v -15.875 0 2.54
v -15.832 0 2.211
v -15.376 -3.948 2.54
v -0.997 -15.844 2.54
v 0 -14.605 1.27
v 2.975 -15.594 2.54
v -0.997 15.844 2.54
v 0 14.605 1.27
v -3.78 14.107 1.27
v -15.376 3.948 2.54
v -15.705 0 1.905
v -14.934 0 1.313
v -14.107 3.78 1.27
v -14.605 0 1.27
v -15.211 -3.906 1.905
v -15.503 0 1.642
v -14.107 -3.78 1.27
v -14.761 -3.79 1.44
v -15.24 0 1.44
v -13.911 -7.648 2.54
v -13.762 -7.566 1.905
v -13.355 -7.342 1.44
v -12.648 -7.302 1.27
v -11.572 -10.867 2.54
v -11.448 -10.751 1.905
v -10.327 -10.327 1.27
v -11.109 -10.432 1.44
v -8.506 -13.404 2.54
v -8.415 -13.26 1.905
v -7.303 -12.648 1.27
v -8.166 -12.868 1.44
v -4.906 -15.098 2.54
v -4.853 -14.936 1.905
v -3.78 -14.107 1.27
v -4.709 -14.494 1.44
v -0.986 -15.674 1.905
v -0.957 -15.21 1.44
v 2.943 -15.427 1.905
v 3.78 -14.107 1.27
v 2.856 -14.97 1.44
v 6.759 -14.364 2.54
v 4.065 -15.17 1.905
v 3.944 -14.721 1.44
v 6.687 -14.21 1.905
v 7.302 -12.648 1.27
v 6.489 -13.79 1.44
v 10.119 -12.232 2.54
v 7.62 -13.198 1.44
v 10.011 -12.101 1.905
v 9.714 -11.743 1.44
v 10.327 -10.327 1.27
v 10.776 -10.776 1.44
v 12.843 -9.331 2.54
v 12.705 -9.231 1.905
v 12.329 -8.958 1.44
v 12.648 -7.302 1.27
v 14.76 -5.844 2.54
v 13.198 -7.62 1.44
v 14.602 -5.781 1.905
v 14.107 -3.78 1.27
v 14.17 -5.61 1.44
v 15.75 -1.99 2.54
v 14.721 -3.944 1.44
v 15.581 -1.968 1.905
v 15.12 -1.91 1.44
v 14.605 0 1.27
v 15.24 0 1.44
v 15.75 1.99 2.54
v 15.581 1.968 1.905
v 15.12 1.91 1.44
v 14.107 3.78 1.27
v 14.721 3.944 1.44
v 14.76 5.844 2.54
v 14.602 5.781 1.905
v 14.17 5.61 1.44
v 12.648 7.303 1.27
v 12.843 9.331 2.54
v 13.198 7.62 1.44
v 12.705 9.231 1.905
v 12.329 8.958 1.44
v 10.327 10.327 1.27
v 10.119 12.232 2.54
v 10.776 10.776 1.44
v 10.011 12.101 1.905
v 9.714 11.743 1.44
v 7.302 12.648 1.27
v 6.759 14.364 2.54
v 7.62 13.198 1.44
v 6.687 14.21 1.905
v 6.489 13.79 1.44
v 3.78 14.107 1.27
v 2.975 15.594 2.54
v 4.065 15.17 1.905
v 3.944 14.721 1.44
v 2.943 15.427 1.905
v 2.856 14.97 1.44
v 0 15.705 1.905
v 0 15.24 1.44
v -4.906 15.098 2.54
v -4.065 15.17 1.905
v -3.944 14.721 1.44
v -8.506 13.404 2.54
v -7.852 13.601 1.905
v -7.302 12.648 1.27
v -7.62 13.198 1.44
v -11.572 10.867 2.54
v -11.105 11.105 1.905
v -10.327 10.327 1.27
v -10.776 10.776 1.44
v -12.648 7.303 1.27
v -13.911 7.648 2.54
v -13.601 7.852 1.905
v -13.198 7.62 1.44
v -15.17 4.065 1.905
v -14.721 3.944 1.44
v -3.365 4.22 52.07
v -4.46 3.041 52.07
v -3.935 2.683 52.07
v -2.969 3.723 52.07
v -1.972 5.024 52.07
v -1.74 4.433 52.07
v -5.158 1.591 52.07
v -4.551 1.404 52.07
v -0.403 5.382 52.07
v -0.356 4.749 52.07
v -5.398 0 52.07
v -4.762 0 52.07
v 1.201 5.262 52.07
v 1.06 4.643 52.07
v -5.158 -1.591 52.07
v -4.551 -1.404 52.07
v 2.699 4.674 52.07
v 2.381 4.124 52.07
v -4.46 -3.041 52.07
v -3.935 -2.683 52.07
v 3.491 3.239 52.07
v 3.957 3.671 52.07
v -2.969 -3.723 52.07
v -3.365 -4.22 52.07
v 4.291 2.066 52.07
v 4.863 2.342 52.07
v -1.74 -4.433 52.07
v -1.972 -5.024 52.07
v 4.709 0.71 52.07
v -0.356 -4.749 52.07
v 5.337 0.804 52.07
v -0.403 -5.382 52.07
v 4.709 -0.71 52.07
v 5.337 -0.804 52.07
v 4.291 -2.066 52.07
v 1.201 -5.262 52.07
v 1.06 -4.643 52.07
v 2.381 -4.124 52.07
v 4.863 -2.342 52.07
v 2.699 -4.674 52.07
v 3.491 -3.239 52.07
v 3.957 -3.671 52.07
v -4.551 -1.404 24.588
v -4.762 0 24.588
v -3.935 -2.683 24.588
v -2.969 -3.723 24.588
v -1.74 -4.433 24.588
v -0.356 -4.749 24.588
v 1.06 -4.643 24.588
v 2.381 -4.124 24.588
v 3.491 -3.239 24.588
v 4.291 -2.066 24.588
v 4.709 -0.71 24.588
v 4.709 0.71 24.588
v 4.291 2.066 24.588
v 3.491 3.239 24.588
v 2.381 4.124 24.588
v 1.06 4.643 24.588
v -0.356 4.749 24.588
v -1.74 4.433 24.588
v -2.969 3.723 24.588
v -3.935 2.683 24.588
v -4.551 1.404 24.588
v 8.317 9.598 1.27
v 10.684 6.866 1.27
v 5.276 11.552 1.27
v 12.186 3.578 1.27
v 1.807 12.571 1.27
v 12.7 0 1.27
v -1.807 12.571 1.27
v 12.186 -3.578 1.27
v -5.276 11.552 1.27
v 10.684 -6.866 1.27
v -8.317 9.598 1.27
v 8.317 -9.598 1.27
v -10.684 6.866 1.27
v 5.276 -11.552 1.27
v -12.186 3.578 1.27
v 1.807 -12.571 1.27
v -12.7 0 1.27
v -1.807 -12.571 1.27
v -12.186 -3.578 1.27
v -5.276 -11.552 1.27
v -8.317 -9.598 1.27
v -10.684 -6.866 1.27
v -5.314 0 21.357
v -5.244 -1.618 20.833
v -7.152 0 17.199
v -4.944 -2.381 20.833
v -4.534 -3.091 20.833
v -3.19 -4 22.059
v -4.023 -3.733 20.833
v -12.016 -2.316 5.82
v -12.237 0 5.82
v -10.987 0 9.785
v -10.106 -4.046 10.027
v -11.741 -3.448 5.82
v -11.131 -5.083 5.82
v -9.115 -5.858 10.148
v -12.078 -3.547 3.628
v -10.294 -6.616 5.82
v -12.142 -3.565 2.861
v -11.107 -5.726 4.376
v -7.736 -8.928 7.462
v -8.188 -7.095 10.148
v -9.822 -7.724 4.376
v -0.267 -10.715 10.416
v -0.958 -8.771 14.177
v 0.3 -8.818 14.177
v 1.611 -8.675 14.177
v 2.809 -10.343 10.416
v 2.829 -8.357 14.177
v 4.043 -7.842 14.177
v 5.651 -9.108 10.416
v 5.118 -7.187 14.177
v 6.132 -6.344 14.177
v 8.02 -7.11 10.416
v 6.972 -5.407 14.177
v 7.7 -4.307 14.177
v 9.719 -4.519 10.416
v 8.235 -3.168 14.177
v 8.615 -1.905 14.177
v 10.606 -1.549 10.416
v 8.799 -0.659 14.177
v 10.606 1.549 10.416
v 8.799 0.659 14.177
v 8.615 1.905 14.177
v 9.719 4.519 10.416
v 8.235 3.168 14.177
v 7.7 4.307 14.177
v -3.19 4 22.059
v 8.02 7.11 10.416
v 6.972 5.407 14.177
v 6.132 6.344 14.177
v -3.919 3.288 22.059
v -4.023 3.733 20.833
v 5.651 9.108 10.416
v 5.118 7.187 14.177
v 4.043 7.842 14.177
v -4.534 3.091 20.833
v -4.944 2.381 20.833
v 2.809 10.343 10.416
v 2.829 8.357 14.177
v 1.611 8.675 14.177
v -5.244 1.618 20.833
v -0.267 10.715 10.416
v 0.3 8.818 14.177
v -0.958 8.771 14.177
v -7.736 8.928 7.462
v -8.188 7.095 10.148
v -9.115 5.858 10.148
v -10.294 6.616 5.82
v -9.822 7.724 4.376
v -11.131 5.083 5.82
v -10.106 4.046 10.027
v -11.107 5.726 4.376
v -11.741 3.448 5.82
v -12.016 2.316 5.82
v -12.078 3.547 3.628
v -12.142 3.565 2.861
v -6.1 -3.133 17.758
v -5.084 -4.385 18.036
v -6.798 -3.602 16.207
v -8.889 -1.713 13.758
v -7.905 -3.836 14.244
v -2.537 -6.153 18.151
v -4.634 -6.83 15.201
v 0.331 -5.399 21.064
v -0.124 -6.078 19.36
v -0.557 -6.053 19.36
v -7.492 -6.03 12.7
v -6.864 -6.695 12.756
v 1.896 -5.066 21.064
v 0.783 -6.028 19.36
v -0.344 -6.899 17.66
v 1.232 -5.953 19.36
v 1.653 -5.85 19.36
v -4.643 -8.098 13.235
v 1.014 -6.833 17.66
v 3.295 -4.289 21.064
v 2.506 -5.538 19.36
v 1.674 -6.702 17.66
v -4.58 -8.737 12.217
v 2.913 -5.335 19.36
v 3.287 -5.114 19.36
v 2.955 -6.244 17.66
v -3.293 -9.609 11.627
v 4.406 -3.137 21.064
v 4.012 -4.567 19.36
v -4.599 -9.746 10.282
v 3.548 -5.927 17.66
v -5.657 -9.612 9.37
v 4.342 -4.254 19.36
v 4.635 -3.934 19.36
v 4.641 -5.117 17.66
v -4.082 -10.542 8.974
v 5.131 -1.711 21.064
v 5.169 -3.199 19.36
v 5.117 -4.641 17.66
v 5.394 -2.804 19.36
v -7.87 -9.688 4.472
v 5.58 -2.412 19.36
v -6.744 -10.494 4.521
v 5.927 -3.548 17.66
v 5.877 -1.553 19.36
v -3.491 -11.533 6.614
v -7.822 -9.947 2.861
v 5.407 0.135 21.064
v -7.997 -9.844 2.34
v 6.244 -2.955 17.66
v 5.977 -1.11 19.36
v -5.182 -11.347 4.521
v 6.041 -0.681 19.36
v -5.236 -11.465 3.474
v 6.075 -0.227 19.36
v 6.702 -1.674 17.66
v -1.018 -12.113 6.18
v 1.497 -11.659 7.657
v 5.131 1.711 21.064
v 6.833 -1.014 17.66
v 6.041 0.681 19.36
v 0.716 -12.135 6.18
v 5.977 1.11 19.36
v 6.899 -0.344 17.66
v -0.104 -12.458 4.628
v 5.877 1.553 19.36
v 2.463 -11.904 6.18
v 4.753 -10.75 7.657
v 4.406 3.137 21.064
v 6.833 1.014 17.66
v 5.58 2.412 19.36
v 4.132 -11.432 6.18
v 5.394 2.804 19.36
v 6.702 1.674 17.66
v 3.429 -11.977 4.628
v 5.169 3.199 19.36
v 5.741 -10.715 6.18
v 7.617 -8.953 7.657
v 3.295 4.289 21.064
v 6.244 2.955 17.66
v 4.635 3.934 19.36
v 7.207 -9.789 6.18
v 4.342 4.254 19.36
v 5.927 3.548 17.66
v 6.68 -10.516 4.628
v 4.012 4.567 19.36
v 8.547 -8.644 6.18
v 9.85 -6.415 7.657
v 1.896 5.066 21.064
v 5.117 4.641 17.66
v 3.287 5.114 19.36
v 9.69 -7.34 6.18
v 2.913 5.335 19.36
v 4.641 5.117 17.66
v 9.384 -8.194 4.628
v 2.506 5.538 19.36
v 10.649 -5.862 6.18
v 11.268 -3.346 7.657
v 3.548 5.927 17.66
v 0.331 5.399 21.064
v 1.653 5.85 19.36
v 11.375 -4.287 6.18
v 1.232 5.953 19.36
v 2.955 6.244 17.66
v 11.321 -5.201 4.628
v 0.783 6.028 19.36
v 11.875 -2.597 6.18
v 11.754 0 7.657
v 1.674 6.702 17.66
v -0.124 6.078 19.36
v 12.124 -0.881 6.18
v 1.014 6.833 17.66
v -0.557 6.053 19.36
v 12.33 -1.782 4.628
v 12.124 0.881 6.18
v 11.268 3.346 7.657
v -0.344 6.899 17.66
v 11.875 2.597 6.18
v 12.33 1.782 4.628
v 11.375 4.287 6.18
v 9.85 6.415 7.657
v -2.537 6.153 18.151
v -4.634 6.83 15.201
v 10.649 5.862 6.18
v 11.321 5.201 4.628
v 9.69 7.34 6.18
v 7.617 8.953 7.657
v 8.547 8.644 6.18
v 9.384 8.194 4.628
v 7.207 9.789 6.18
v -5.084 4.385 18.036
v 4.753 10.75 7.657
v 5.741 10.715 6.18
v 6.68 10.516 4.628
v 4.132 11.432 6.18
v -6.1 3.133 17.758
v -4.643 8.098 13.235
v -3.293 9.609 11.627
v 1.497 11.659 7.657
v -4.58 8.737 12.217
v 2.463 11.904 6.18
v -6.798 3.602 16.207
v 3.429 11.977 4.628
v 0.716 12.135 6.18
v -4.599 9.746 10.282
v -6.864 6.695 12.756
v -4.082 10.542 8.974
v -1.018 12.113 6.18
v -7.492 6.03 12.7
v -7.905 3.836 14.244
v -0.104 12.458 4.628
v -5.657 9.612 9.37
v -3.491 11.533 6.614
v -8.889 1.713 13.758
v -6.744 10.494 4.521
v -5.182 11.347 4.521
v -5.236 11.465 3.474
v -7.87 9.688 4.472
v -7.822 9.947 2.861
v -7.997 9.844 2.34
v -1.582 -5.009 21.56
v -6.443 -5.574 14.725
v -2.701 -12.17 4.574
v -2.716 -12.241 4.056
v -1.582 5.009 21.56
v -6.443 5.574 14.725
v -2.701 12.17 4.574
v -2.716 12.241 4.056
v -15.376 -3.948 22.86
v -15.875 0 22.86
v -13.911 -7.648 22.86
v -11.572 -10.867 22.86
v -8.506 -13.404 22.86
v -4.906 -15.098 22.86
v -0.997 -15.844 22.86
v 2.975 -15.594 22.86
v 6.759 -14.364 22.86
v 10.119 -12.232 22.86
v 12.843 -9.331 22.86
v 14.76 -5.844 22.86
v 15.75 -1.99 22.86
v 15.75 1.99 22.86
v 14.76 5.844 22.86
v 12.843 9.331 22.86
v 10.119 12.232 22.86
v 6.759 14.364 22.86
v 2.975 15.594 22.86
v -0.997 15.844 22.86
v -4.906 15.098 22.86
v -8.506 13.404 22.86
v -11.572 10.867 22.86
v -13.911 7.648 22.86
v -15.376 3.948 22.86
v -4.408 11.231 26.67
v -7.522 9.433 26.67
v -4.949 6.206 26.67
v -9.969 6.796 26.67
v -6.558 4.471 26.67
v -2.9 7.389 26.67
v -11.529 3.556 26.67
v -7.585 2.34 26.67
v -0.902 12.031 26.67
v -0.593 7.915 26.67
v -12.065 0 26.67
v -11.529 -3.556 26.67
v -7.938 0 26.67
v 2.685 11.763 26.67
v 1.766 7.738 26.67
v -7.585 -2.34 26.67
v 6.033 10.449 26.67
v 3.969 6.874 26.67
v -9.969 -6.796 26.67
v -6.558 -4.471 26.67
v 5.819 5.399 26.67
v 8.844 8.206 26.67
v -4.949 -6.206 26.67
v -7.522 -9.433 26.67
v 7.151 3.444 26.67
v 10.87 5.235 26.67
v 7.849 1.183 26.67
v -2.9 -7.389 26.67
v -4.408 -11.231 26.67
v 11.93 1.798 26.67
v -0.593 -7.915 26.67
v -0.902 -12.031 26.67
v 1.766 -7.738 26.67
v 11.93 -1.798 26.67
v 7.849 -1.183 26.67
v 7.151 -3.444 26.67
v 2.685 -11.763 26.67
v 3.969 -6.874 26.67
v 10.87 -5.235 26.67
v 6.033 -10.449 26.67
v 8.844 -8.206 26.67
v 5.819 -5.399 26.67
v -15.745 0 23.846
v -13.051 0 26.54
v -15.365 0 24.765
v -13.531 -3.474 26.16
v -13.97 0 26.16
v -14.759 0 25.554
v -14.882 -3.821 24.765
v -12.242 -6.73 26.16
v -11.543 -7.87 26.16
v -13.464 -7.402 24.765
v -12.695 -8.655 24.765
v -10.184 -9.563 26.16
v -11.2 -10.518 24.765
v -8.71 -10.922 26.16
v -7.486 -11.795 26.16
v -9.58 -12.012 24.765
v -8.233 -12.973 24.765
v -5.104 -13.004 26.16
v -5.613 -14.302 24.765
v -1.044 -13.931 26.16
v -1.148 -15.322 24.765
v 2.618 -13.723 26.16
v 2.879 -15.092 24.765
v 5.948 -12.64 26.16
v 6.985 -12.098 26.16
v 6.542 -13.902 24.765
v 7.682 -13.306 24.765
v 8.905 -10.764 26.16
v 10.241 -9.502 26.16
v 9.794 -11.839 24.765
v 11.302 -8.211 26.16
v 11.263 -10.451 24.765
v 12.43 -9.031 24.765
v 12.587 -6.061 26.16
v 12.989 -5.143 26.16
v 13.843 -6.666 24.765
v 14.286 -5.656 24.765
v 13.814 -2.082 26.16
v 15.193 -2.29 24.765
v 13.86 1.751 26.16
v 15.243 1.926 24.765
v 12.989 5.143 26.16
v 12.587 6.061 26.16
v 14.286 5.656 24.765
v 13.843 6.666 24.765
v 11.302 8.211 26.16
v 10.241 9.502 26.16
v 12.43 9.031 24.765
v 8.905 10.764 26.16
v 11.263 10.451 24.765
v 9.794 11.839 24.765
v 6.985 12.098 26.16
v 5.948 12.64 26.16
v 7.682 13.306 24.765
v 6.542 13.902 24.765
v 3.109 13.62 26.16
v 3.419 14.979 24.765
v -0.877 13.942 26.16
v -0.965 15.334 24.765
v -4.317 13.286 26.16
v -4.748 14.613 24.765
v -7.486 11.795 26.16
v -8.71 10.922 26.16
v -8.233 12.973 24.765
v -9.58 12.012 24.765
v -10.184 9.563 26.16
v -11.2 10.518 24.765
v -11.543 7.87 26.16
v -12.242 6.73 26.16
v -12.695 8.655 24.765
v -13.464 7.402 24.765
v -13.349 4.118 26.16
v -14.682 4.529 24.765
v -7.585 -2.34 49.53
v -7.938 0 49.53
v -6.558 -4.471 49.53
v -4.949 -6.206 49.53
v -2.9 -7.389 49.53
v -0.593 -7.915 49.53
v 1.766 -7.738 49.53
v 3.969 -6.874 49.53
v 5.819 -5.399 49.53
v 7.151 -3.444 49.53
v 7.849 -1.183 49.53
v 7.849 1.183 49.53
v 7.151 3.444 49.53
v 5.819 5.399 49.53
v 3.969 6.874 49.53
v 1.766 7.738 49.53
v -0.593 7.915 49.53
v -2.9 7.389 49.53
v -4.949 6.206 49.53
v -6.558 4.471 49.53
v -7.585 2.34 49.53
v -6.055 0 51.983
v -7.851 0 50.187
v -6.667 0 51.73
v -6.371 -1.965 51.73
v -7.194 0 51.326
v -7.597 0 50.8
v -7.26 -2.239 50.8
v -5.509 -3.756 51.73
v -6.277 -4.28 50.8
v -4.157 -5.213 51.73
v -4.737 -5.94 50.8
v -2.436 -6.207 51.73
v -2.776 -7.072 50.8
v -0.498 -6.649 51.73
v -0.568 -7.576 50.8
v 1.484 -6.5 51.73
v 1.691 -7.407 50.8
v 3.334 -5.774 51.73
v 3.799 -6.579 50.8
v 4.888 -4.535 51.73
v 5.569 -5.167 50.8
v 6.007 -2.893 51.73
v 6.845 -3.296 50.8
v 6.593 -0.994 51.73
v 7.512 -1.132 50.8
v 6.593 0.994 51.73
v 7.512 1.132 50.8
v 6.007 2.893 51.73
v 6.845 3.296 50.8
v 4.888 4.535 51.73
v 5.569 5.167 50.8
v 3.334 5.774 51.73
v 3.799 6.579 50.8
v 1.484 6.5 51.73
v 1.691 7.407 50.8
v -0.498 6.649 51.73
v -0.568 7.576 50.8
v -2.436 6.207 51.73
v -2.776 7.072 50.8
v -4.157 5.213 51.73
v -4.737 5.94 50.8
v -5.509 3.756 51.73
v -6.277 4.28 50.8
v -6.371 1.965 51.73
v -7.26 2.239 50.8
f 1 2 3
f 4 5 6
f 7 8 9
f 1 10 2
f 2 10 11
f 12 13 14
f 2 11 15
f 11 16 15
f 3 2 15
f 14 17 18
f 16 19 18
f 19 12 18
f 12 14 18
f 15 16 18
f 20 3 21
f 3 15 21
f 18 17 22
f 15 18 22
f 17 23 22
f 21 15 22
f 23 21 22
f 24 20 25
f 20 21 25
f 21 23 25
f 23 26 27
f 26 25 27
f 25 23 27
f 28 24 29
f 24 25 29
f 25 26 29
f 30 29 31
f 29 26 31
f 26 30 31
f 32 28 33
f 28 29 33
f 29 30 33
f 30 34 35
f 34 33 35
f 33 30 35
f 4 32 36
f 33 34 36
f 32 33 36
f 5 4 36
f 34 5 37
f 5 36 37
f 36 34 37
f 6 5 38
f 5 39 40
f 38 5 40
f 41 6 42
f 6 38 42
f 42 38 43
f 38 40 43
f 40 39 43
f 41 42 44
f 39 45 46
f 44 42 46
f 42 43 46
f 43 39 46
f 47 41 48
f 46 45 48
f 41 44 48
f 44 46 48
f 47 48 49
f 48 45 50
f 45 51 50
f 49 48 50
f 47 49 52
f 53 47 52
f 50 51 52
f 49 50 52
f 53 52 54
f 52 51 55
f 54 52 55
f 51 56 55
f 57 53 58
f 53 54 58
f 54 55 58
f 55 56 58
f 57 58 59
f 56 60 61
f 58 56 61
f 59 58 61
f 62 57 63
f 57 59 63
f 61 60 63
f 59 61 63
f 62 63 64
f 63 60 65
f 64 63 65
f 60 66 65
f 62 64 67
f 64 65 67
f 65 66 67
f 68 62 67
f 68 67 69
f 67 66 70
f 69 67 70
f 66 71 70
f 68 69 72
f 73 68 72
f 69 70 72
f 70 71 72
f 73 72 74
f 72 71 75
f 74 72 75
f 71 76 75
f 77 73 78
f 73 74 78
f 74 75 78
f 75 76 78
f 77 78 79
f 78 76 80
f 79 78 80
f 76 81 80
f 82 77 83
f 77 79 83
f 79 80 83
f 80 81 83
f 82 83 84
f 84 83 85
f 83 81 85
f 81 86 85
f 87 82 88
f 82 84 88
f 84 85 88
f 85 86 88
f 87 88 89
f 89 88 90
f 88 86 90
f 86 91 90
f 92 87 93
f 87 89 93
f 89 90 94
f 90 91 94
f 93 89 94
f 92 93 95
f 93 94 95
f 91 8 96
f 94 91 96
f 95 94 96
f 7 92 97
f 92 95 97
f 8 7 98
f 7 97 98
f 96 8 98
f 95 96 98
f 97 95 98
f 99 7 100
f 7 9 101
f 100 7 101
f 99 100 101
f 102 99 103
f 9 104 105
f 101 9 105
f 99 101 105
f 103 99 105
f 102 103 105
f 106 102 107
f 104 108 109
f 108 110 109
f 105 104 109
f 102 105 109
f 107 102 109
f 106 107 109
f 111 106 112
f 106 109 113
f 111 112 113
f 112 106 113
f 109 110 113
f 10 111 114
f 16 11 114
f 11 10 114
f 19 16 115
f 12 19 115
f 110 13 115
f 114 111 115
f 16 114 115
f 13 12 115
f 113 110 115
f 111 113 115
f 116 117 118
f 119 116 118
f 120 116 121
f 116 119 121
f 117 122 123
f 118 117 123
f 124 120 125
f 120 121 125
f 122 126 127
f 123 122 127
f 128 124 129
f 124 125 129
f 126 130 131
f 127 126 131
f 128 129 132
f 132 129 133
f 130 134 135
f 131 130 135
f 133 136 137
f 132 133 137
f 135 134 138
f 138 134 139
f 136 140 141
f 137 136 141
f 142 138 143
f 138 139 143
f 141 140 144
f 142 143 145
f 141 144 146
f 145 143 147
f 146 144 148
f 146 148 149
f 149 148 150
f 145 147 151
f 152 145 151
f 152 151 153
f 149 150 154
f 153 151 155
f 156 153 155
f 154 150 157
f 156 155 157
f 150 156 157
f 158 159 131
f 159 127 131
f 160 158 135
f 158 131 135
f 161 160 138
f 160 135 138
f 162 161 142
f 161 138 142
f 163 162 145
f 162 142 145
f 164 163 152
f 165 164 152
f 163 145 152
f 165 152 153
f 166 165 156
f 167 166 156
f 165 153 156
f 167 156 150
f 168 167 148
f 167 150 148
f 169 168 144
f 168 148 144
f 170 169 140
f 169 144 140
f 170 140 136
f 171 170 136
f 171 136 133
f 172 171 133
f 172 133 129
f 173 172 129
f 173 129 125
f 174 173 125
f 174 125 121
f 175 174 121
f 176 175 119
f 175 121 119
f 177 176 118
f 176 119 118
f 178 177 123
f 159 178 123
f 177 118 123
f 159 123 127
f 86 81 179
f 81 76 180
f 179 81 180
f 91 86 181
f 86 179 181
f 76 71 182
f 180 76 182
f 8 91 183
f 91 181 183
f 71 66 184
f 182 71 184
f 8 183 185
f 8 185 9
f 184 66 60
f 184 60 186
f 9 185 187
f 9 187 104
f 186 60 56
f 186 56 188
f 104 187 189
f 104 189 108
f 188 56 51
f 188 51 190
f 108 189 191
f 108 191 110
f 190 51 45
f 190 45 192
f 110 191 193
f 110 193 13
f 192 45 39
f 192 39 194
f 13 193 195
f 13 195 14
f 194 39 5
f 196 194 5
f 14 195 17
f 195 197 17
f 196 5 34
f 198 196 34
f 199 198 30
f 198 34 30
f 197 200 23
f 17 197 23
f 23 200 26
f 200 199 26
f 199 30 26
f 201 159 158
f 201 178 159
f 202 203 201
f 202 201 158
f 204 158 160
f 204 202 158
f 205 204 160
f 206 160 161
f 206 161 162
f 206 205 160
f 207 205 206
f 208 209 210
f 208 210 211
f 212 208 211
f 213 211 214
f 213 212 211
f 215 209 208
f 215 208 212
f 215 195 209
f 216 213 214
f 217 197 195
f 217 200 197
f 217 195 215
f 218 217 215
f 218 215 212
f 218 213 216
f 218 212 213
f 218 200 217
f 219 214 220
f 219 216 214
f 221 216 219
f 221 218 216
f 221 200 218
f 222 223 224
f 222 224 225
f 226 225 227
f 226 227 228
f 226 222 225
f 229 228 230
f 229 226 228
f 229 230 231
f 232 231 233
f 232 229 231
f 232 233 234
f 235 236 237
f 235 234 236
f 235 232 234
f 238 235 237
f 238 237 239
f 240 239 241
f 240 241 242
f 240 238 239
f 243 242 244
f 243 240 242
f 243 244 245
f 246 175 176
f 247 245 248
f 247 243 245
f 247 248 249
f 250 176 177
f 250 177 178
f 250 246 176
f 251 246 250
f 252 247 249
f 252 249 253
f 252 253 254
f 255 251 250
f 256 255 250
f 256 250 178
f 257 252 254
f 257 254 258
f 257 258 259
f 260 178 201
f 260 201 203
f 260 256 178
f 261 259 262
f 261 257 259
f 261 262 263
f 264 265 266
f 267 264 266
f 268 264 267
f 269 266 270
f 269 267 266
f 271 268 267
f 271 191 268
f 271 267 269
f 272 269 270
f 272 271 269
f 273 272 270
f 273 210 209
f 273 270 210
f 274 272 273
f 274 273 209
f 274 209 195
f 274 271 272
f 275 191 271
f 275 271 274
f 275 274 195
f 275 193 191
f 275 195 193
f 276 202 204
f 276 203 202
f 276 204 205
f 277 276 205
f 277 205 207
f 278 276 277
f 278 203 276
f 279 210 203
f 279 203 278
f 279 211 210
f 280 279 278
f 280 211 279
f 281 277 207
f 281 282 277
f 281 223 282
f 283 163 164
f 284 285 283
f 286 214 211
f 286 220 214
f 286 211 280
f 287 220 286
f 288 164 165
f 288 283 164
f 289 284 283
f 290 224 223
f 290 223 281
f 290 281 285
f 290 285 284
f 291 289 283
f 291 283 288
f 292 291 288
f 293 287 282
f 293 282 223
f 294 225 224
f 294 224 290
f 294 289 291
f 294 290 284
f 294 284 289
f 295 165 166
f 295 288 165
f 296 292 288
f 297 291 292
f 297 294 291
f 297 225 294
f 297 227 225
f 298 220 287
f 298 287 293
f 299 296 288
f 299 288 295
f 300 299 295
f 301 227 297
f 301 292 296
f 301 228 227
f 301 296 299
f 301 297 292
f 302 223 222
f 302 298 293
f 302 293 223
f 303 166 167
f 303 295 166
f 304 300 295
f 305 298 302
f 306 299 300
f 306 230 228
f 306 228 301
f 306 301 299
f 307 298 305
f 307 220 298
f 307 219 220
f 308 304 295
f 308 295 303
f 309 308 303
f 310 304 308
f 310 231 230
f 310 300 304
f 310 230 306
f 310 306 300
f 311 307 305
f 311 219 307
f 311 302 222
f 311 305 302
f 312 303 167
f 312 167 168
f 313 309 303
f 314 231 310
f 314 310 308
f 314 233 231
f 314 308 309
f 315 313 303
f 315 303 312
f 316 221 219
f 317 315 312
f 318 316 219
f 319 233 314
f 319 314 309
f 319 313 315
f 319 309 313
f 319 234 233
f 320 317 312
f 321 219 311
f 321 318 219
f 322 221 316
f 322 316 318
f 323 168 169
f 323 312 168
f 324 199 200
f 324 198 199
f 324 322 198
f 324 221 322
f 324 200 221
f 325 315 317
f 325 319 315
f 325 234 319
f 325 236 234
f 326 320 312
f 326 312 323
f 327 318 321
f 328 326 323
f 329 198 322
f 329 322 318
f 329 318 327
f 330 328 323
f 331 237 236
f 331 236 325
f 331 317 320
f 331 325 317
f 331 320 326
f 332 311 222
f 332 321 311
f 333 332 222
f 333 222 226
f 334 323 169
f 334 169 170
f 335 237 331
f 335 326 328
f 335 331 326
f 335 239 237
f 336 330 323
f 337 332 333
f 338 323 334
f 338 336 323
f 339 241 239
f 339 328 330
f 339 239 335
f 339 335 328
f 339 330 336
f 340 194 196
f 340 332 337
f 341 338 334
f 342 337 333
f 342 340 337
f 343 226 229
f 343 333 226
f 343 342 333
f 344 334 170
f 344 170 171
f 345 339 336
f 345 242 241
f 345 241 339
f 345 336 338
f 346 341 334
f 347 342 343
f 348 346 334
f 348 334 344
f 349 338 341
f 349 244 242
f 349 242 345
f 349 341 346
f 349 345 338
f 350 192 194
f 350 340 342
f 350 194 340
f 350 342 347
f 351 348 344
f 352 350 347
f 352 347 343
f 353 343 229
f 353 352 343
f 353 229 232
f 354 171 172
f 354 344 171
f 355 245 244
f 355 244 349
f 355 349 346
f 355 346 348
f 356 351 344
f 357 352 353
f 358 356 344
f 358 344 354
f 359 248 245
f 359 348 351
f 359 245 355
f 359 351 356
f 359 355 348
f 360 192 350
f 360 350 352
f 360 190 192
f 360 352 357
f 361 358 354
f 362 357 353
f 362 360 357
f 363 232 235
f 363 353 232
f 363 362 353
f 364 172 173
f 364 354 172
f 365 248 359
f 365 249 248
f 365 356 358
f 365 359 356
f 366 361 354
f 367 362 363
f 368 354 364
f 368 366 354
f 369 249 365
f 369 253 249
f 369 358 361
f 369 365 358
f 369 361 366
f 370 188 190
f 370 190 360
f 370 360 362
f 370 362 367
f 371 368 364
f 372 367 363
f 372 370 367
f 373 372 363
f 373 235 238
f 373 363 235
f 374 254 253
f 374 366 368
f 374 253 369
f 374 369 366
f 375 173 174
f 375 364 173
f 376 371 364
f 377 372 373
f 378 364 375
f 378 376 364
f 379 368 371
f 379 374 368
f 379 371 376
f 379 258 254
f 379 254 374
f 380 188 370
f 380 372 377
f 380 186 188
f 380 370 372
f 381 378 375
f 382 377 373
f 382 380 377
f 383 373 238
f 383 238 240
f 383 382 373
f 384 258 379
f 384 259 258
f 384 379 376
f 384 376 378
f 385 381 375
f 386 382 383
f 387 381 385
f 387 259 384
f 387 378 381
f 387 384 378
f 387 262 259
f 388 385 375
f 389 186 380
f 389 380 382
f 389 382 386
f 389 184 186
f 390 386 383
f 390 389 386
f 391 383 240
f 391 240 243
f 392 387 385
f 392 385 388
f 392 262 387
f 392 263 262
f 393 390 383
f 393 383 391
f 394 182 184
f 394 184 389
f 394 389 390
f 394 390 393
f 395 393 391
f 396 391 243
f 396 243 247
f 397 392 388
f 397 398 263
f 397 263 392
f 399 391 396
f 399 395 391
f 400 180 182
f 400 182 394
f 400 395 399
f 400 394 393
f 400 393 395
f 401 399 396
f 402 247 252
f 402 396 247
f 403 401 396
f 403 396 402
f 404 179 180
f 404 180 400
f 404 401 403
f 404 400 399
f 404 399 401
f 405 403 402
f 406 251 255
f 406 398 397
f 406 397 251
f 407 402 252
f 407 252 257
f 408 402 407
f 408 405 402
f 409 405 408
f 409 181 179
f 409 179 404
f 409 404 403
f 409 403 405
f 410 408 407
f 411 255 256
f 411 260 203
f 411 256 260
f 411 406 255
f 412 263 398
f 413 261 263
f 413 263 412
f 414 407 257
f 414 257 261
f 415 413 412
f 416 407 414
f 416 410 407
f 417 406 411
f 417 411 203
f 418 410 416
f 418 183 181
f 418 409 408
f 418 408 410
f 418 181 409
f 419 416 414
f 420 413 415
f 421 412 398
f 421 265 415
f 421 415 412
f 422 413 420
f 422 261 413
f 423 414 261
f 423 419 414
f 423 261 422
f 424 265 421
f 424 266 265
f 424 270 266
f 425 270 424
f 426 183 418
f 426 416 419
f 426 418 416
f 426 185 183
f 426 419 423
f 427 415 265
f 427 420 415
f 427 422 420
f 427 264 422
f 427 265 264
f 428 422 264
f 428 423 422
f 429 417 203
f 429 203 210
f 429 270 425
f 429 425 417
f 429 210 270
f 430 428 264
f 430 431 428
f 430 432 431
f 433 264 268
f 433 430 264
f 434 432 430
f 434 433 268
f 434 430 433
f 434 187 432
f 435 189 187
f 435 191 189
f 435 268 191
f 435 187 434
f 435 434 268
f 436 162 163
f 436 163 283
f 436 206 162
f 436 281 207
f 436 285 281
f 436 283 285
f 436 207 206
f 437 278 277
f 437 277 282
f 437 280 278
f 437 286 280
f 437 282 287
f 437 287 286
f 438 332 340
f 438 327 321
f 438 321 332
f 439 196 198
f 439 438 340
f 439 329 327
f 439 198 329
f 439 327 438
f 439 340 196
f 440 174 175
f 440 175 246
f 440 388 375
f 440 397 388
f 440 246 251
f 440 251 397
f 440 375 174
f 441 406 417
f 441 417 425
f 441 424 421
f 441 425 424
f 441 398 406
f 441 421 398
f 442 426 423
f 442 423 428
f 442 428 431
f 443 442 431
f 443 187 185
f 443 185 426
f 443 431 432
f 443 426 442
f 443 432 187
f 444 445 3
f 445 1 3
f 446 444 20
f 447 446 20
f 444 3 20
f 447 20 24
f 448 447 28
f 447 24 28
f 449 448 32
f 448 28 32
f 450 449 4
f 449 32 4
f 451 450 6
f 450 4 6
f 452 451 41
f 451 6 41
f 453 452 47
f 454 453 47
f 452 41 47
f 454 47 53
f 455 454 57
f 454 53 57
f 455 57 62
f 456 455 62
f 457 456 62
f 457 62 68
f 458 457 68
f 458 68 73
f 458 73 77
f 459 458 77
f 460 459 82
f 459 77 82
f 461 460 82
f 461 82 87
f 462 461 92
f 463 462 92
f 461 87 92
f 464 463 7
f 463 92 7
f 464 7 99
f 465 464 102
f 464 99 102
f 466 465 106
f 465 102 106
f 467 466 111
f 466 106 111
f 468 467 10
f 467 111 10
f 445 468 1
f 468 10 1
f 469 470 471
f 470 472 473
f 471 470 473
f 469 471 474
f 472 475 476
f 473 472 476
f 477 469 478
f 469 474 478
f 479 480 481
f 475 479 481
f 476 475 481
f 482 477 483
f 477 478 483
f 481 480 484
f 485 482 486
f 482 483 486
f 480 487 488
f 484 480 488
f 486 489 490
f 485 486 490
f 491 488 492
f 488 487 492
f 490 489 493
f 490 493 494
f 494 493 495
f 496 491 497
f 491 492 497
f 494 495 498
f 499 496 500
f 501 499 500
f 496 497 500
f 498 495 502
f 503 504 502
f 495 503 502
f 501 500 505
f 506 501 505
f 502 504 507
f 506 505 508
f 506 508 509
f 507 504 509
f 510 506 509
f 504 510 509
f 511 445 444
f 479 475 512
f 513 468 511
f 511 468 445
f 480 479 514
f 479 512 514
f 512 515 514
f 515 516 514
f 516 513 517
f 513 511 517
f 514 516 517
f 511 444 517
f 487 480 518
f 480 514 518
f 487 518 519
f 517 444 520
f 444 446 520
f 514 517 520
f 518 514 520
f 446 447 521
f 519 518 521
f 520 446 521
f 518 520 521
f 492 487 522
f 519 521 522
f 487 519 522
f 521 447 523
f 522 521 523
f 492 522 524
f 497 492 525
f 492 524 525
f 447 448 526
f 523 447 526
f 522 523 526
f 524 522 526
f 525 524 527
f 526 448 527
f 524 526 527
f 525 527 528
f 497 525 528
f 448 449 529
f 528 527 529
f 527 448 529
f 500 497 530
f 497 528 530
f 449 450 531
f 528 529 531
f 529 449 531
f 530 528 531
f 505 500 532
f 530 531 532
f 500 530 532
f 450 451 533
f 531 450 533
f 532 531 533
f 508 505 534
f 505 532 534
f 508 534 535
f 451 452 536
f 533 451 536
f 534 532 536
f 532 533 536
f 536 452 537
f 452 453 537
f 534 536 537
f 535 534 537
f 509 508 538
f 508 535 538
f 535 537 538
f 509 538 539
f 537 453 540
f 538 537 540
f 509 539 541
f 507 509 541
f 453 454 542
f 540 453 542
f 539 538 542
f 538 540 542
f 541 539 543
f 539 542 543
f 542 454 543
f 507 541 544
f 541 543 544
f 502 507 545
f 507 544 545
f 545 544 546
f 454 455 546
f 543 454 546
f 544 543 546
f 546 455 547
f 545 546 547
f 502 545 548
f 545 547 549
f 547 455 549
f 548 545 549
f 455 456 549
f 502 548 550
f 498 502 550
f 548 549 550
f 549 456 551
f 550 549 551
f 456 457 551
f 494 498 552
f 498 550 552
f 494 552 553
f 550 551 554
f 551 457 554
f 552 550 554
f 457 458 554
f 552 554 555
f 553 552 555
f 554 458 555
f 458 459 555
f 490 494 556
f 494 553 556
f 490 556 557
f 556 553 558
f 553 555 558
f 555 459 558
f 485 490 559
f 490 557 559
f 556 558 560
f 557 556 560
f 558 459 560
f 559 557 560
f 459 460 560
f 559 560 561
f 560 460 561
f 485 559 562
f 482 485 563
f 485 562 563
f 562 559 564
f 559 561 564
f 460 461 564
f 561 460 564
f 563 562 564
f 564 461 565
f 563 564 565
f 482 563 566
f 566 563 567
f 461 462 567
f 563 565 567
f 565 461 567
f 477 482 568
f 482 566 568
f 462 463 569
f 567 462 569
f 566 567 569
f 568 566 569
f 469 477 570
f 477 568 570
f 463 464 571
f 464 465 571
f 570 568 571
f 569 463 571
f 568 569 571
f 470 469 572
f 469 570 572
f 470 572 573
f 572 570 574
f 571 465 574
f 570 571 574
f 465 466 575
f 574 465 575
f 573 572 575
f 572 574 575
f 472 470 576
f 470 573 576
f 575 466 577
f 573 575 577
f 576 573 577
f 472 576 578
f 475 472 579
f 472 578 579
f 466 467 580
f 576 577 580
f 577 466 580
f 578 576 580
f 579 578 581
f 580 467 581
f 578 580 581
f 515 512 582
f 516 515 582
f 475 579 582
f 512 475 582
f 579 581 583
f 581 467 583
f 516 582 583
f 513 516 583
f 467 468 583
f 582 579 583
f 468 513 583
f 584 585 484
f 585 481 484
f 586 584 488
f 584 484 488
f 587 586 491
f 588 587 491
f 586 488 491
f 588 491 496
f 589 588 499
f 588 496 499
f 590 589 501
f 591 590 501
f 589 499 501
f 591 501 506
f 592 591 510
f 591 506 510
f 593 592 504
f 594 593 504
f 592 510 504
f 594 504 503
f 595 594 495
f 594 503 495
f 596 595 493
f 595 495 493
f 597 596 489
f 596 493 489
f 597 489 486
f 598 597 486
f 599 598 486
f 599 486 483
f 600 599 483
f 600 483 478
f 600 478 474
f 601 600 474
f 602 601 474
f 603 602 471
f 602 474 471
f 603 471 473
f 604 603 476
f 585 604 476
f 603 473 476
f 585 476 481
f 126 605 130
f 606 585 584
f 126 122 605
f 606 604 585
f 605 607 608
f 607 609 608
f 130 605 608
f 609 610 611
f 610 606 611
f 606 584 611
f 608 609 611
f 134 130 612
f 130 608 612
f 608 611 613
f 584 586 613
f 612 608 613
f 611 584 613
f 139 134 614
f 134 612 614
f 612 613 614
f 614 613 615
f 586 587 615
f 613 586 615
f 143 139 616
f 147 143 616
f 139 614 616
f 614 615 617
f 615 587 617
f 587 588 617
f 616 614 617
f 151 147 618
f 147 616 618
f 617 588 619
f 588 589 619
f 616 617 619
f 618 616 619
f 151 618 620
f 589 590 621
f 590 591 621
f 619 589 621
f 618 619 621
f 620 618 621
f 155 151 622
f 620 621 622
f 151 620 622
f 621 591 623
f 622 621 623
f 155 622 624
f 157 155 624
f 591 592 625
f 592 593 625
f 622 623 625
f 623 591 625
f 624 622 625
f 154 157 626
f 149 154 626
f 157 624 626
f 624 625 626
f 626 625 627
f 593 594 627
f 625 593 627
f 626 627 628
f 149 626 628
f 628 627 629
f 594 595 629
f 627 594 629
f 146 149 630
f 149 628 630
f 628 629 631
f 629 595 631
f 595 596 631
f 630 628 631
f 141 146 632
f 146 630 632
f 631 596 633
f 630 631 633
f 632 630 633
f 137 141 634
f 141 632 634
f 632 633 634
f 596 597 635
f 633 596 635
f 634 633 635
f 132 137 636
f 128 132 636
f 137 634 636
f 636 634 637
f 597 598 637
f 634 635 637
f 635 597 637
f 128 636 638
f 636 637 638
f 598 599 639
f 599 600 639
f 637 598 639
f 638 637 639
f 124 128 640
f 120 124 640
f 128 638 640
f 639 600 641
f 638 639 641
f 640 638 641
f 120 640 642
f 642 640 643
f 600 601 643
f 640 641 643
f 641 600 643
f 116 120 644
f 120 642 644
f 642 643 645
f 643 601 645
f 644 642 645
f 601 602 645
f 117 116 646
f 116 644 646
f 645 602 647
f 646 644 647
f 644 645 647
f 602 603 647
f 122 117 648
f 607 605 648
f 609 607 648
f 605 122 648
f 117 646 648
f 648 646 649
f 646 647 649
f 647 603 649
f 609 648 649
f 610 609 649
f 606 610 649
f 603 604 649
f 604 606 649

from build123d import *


with BuildPart() as f1:
    # F0 (on Front) → F1 (revolve)
    with BuildSketch(Plane.XZ):
        with BuildLine():
            Line((-15.875, 22.86), (-15.875, 2.54))
            ThreePointArc((-15.875, 2.54), (-15.503026, 1.641974), (-14.605, 1.27))
            Line((-14.605, 1.27), (-12.7, 1.27))
            add(Edge.make_bspline(
                [(-4.7625, 24.587877), (-4.910941, 17.2893), (-12.796914, 11.896686), (-12.7, 1.27)],
                knots=[0, 0, 0, 0, 24.631835, 24.631835, 24.631835, 24.631835], degree=3))
            Line((-4.7625, 24.587877), (-4.7625, 52.07))
            Line((-4.7625, 52.07), (-5.3975, 52.07))
            ThreePointArc((-5.3975, 52.07), (-7.193551, 51.326051), (-7.9375, 49.53))
            Line((-7.9375, 49.53), (-7.9375, 26.67))
            Line((-7.9375, 26.67), (-12.065, 26.67))
            ThreePointArc((-12.065, 26.67), (-14.759077, 25.554077), (-15.875, 22.86))
        make_face()
    revolve(axis=Axis((0, 0, 25.536608), (0, 0, 1)))


solid = f1.part
